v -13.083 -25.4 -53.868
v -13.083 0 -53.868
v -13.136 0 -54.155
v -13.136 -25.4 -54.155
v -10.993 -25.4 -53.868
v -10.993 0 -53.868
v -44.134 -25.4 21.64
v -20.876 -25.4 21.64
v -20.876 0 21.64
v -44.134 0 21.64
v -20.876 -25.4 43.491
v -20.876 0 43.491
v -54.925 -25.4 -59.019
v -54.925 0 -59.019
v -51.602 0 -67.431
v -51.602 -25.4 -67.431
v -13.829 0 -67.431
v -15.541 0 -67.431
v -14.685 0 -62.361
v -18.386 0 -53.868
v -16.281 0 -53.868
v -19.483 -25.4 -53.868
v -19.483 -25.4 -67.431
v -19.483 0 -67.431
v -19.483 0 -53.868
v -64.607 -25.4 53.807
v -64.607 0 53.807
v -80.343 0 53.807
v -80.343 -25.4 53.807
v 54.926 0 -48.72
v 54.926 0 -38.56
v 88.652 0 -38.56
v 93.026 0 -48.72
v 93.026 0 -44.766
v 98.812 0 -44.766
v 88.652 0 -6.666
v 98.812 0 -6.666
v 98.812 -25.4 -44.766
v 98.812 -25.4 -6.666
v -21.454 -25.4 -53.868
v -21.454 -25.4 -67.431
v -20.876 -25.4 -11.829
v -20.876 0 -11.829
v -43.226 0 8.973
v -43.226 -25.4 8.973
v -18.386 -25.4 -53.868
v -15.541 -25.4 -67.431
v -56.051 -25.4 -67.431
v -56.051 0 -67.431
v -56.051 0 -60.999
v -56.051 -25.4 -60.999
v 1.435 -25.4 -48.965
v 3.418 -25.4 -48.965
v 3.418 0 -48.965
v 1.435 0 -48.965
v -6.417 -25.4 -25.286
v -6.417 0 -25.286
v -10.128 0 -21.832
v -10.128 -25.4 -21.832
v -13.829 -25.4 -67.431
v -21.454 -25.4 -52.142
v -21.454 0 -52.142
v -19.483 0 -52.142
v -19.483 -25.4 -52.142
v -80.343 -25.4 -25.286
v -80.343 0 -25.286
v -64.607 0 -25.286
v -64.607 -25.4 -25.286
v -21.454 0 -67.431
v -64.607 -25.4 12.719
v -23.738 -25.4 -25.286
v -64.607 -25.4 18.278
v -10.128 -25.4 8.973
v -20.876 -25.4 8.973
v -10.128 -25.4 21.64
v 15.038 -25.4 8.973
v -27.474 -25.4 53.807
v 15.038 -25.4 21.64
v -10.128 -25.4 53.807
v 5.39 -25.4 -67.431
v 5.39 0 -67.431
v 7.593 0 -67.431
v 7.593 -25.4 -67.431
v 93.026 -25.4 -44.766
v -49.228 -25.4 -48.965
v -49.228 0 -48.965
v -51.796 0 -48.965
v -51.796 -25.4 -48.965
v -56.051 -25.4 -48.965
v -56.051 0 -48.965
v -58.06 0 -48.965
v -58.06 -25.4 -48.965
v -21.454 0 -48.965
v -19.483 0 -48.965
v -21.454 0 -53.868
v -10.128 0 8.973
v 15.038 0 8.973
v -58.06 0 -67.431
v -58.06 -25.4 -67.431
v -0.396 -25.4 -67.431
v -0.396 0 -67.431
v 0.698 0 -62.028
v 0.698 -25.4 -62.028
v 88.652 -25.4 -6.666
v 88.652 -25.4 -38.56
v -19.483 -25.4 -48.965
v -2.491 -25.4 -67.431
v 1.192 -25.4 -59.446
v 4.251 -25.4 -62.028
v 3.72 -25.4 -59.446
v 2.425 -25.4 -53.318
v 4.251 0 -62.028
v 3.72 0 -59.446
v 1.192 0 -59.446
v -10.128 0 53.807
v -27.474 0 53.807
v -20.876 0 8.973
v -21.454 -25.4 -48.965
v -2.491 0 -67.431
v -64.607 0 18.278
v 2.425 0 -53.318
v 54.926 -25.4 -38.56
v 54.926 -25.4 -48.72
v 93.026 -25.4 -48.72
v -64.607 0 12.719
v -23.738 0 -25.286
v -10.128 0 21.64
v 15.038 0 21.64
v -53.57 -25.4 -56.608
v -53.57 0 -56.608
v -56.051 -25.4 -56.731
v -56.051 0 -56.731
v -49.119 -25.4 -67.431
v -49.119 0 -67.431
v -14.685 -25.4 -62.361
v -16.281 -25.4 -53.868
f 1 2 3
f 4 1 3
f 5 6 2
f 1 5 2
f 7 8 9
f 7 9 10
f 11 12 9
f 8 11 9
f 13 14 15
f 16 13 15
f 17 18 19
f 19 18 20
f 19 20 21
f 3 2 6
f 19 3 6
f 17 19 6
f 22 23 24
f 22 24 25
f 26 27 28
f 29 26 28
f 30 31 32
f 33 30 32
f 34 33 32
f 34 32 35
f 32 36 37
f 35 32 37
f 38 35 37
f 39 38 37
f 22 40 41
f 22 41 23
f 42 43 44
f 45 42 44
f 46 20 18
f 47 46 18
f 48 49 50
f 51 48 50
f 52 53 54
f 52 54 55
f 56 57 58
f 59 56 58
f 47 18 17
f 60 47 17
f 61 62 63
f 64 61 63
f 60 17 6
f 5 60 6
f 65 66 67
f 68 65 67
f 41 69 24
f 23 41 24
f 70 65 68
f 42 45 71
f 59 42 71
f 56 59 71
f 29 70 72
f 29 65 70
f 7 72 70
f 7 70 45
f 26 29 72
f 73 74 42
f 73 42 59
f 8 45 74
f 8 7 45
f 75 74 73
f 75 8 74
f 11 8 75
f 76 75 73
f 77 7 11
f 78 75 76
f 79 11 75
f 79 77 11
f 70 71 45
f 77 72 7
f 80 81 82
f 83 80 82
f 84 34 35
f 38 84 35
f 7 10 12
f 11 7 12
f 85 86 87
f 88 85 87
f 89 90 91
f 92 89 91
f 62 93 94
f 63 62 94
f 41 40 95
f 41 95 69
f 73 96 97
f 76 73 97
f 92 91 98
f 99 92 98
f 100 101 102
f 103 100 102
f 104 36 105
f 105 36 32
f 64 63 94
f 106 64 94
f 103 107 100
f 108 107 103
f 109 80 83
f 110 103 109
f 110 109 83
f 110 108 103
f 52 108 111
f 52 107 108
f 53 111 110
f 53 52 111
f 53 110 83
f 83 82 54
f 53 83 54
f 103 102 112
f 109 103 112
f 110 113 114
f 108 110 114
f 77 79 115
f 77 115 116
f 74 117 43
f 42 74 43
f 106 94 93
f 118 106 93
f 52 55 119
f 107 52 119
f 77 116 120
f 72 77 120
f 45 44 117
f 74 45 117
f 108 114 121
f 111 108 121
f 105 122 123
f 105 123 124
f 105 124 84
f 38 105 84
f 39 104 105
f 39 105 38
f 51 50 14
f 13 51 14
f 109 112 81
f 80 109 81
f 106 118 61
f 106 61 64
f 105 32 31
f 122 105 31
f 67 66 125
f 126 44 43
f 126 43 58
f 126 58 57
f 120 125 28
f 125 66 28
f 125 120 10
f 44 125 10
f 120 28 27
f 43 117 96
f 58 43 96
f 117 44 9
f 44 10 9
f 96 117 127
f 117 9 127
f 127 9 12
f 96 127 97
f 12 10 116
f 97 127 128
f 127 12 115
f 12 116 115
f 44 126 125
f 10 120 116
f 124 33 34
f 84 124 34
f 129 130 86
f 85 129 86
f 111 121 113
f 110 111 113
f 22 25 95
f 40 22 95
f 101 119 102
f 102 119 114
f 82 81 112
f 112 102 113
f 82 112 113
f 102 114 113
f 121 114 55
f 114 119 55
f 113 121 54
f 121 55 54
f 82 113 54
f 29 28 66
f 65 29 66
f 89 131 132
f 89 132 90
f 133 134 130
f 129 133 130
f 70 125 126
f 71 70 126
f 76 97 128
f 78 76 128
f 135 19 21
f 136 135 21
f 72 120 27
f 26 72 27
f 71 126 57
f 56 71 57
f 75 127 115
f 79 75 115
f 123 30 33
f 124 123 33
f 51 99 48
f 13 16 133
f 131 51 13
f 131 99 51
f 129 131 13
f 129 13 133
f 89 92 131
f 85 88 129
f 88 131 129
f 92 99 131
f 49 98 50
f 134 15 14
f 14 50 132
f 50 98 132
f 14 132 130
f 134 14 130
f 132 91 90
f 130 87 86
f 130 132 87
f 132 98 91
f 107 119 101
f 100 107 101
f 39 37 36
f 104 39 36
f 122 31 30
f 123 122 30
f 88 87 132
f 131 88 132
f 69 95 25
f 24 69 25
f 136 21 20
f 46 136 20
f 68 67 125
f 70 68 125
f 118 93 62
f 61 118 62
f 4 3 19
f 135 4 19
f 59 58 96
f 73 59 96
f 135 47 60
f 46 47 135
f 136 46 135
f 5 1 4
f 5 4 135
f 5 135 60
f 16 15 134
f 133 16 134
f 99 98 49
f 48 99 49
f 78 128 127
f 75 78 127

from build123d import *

# Parameters (mm, degrees)
F1_DEPTH = 25.4
F0_W     = 4.3742356
F0_H     = 6.2060074


with BuildPart() as f1:
    # F0 (on Front) → F1 (new body)
    with BuildSketch(Plane.XZ):
        Polygon((-64.6065256, 18.2781956), (-64.6065256, 53.806979), (-80.3425368, 53.806979), (-80.3425368, -25.2860556), (-64.6065256, -25.2860556), (-64.6065256, 12.7188722), (-23.738078, -25.2860556), (-6.4171576, -25.2860556), (-10.1278944, -21.8323414), (-10.1278944, 8.972677), (15.0378414, 8.972677), (15.0378414, 21.6399364), (-10.1278944, 21.6399364), (-10.1278944, 52.5436592), (-10.1278944, 53.806979), (-10.3793798, 53.806979), (-27.4739354, 53.806979), align=None)
        Polygon((-20.875879, 8.972677), (-20.875879, -11.829161), (-43.2263042, 8.972677), align=None, mode=Mode.SUBTRACT)
        Polygon((-44.133897, 21.6399364), (-20.875879, 43.4906166), (-20.875879, 21.6399364), align=None, mode=Mode.SUBTRACT)
    extrude(amount=F1_DEPTH)


with BuildPart() as f1b:
    # F0 (on Front) → F1, piece 2 (new body)
    with BuildSketch(Plane.XZ):
        Polygon((-19.8351394, -48.9648754), (-21.4543132, -48.9648754), (-21.4543132, -52.1416026), (-19.482689, -52.1416026), (-19.482689, -48.9648754), align=None)
    extrude(amount=F1_DEPTH)


with BuildPart() as f1c:
    # F0 (on Front) → F1, piece 3 (new body)
    with BuildSketch(Plane.XZ):
        Polygon((-19.8351394, -53.8676088), (-21.4543132, -53.8676088), (-21.4543132, -67.4305992), (-19.482689, -67.4305992), (-19.482689, -53.8676088), align=None)
    extrude(amount=F1_DEPTH)


with BuildPart() as f1d:
    # F0 (on Front) → F1, piece 4 (new body)
    with BuildSketch(Plane.XZ):
        Polygon((-13.0827526, -53.8676088), (-13.1364736, -54.1549082), (-14.6847052, -62.3614704), (-16.2811714, -53.8676088), (-18.3864758, -53.8676088), (-15.541498, -67.4305992), (-13.829284, -67.4305992), (-10.992612, -53.8676088), align=None)
    extrude(amount=F1_DEPTH)


with BuildPart() as f1e:
    # F0 (on Front) → F1, piece 5 (new body)
    with BuildSketch(Plane.XZ):
        Polygon((3.4182304, -48.9648754), (3.136773, -48.9648754), (1.435227, -48.9648754), (-2.4911304, -67.4305992), (-0.3958336, -67.4305992), (0.6976364, -62.0279938), (4.2512488, -62.0279938), (5.3898546, -67.4305992), (7.5933554, -67.4305992), align=None)
        Polygon((2.4253444, -53.3184608), (3.7200332, -59.4455504), (1.192276, -59.4455504), align=None, mode=Mode.SUBTRACT)
    extrude(amount=F1_DEPTH)


with BuildPart() as f1f:
    # F0 (on Front) → F1, piece 6 (new body)
    with BuildSketch(Plane.XZ):
        Polygon((-53.569997, -56.6081672), (-49.2278162, -48.9648754), (-51.795807, -48.9648754), (-56.0511706, -56.731154), (-56.0511706, -48.9648754), (-58.0601836, -48.9648754), (-58.0601836, -67.4305992), (-56.0511706, -67.4305992), (-56.0511706, -60.9992938), (-54.9254934, -59.019059), (-51.602005, -67.4305992), (-49.1193074, -67.4305992), align=None)
    extrude(amount=F1_DEPTH)


with BuildPart() as f1g:
    # F0 (on Front) → F1, piece 7 (new body)
    with BuildSketch(Plane.XZ):
        Polygon((88.6516134, -38.5603242), (93.025849, -38.5603242), (93.025849, -44.7663316), (98.8115372, -44.7663316), (98.8115372, -6.6663316), (88.6516134, -6.6663316), align=None)
        with Locations((90.8387312, -41.6633279)):
            Rectangle(F0_W, F0_H)
        Polygon((93.025849, -48.7202734), (93.025849, -44.7663316), (88.6516134, -44.7663316), (88.6516134, -38.5603242), (54.925849, -38.5603242), (54.925849, -48.7202734), align=None)
    extrude(amount=F1_DEPTH)


solid = Compound([f1.part, f1b.part, f1c.part, f1d.part, f1e.part, f1f.part, f1g.part])
